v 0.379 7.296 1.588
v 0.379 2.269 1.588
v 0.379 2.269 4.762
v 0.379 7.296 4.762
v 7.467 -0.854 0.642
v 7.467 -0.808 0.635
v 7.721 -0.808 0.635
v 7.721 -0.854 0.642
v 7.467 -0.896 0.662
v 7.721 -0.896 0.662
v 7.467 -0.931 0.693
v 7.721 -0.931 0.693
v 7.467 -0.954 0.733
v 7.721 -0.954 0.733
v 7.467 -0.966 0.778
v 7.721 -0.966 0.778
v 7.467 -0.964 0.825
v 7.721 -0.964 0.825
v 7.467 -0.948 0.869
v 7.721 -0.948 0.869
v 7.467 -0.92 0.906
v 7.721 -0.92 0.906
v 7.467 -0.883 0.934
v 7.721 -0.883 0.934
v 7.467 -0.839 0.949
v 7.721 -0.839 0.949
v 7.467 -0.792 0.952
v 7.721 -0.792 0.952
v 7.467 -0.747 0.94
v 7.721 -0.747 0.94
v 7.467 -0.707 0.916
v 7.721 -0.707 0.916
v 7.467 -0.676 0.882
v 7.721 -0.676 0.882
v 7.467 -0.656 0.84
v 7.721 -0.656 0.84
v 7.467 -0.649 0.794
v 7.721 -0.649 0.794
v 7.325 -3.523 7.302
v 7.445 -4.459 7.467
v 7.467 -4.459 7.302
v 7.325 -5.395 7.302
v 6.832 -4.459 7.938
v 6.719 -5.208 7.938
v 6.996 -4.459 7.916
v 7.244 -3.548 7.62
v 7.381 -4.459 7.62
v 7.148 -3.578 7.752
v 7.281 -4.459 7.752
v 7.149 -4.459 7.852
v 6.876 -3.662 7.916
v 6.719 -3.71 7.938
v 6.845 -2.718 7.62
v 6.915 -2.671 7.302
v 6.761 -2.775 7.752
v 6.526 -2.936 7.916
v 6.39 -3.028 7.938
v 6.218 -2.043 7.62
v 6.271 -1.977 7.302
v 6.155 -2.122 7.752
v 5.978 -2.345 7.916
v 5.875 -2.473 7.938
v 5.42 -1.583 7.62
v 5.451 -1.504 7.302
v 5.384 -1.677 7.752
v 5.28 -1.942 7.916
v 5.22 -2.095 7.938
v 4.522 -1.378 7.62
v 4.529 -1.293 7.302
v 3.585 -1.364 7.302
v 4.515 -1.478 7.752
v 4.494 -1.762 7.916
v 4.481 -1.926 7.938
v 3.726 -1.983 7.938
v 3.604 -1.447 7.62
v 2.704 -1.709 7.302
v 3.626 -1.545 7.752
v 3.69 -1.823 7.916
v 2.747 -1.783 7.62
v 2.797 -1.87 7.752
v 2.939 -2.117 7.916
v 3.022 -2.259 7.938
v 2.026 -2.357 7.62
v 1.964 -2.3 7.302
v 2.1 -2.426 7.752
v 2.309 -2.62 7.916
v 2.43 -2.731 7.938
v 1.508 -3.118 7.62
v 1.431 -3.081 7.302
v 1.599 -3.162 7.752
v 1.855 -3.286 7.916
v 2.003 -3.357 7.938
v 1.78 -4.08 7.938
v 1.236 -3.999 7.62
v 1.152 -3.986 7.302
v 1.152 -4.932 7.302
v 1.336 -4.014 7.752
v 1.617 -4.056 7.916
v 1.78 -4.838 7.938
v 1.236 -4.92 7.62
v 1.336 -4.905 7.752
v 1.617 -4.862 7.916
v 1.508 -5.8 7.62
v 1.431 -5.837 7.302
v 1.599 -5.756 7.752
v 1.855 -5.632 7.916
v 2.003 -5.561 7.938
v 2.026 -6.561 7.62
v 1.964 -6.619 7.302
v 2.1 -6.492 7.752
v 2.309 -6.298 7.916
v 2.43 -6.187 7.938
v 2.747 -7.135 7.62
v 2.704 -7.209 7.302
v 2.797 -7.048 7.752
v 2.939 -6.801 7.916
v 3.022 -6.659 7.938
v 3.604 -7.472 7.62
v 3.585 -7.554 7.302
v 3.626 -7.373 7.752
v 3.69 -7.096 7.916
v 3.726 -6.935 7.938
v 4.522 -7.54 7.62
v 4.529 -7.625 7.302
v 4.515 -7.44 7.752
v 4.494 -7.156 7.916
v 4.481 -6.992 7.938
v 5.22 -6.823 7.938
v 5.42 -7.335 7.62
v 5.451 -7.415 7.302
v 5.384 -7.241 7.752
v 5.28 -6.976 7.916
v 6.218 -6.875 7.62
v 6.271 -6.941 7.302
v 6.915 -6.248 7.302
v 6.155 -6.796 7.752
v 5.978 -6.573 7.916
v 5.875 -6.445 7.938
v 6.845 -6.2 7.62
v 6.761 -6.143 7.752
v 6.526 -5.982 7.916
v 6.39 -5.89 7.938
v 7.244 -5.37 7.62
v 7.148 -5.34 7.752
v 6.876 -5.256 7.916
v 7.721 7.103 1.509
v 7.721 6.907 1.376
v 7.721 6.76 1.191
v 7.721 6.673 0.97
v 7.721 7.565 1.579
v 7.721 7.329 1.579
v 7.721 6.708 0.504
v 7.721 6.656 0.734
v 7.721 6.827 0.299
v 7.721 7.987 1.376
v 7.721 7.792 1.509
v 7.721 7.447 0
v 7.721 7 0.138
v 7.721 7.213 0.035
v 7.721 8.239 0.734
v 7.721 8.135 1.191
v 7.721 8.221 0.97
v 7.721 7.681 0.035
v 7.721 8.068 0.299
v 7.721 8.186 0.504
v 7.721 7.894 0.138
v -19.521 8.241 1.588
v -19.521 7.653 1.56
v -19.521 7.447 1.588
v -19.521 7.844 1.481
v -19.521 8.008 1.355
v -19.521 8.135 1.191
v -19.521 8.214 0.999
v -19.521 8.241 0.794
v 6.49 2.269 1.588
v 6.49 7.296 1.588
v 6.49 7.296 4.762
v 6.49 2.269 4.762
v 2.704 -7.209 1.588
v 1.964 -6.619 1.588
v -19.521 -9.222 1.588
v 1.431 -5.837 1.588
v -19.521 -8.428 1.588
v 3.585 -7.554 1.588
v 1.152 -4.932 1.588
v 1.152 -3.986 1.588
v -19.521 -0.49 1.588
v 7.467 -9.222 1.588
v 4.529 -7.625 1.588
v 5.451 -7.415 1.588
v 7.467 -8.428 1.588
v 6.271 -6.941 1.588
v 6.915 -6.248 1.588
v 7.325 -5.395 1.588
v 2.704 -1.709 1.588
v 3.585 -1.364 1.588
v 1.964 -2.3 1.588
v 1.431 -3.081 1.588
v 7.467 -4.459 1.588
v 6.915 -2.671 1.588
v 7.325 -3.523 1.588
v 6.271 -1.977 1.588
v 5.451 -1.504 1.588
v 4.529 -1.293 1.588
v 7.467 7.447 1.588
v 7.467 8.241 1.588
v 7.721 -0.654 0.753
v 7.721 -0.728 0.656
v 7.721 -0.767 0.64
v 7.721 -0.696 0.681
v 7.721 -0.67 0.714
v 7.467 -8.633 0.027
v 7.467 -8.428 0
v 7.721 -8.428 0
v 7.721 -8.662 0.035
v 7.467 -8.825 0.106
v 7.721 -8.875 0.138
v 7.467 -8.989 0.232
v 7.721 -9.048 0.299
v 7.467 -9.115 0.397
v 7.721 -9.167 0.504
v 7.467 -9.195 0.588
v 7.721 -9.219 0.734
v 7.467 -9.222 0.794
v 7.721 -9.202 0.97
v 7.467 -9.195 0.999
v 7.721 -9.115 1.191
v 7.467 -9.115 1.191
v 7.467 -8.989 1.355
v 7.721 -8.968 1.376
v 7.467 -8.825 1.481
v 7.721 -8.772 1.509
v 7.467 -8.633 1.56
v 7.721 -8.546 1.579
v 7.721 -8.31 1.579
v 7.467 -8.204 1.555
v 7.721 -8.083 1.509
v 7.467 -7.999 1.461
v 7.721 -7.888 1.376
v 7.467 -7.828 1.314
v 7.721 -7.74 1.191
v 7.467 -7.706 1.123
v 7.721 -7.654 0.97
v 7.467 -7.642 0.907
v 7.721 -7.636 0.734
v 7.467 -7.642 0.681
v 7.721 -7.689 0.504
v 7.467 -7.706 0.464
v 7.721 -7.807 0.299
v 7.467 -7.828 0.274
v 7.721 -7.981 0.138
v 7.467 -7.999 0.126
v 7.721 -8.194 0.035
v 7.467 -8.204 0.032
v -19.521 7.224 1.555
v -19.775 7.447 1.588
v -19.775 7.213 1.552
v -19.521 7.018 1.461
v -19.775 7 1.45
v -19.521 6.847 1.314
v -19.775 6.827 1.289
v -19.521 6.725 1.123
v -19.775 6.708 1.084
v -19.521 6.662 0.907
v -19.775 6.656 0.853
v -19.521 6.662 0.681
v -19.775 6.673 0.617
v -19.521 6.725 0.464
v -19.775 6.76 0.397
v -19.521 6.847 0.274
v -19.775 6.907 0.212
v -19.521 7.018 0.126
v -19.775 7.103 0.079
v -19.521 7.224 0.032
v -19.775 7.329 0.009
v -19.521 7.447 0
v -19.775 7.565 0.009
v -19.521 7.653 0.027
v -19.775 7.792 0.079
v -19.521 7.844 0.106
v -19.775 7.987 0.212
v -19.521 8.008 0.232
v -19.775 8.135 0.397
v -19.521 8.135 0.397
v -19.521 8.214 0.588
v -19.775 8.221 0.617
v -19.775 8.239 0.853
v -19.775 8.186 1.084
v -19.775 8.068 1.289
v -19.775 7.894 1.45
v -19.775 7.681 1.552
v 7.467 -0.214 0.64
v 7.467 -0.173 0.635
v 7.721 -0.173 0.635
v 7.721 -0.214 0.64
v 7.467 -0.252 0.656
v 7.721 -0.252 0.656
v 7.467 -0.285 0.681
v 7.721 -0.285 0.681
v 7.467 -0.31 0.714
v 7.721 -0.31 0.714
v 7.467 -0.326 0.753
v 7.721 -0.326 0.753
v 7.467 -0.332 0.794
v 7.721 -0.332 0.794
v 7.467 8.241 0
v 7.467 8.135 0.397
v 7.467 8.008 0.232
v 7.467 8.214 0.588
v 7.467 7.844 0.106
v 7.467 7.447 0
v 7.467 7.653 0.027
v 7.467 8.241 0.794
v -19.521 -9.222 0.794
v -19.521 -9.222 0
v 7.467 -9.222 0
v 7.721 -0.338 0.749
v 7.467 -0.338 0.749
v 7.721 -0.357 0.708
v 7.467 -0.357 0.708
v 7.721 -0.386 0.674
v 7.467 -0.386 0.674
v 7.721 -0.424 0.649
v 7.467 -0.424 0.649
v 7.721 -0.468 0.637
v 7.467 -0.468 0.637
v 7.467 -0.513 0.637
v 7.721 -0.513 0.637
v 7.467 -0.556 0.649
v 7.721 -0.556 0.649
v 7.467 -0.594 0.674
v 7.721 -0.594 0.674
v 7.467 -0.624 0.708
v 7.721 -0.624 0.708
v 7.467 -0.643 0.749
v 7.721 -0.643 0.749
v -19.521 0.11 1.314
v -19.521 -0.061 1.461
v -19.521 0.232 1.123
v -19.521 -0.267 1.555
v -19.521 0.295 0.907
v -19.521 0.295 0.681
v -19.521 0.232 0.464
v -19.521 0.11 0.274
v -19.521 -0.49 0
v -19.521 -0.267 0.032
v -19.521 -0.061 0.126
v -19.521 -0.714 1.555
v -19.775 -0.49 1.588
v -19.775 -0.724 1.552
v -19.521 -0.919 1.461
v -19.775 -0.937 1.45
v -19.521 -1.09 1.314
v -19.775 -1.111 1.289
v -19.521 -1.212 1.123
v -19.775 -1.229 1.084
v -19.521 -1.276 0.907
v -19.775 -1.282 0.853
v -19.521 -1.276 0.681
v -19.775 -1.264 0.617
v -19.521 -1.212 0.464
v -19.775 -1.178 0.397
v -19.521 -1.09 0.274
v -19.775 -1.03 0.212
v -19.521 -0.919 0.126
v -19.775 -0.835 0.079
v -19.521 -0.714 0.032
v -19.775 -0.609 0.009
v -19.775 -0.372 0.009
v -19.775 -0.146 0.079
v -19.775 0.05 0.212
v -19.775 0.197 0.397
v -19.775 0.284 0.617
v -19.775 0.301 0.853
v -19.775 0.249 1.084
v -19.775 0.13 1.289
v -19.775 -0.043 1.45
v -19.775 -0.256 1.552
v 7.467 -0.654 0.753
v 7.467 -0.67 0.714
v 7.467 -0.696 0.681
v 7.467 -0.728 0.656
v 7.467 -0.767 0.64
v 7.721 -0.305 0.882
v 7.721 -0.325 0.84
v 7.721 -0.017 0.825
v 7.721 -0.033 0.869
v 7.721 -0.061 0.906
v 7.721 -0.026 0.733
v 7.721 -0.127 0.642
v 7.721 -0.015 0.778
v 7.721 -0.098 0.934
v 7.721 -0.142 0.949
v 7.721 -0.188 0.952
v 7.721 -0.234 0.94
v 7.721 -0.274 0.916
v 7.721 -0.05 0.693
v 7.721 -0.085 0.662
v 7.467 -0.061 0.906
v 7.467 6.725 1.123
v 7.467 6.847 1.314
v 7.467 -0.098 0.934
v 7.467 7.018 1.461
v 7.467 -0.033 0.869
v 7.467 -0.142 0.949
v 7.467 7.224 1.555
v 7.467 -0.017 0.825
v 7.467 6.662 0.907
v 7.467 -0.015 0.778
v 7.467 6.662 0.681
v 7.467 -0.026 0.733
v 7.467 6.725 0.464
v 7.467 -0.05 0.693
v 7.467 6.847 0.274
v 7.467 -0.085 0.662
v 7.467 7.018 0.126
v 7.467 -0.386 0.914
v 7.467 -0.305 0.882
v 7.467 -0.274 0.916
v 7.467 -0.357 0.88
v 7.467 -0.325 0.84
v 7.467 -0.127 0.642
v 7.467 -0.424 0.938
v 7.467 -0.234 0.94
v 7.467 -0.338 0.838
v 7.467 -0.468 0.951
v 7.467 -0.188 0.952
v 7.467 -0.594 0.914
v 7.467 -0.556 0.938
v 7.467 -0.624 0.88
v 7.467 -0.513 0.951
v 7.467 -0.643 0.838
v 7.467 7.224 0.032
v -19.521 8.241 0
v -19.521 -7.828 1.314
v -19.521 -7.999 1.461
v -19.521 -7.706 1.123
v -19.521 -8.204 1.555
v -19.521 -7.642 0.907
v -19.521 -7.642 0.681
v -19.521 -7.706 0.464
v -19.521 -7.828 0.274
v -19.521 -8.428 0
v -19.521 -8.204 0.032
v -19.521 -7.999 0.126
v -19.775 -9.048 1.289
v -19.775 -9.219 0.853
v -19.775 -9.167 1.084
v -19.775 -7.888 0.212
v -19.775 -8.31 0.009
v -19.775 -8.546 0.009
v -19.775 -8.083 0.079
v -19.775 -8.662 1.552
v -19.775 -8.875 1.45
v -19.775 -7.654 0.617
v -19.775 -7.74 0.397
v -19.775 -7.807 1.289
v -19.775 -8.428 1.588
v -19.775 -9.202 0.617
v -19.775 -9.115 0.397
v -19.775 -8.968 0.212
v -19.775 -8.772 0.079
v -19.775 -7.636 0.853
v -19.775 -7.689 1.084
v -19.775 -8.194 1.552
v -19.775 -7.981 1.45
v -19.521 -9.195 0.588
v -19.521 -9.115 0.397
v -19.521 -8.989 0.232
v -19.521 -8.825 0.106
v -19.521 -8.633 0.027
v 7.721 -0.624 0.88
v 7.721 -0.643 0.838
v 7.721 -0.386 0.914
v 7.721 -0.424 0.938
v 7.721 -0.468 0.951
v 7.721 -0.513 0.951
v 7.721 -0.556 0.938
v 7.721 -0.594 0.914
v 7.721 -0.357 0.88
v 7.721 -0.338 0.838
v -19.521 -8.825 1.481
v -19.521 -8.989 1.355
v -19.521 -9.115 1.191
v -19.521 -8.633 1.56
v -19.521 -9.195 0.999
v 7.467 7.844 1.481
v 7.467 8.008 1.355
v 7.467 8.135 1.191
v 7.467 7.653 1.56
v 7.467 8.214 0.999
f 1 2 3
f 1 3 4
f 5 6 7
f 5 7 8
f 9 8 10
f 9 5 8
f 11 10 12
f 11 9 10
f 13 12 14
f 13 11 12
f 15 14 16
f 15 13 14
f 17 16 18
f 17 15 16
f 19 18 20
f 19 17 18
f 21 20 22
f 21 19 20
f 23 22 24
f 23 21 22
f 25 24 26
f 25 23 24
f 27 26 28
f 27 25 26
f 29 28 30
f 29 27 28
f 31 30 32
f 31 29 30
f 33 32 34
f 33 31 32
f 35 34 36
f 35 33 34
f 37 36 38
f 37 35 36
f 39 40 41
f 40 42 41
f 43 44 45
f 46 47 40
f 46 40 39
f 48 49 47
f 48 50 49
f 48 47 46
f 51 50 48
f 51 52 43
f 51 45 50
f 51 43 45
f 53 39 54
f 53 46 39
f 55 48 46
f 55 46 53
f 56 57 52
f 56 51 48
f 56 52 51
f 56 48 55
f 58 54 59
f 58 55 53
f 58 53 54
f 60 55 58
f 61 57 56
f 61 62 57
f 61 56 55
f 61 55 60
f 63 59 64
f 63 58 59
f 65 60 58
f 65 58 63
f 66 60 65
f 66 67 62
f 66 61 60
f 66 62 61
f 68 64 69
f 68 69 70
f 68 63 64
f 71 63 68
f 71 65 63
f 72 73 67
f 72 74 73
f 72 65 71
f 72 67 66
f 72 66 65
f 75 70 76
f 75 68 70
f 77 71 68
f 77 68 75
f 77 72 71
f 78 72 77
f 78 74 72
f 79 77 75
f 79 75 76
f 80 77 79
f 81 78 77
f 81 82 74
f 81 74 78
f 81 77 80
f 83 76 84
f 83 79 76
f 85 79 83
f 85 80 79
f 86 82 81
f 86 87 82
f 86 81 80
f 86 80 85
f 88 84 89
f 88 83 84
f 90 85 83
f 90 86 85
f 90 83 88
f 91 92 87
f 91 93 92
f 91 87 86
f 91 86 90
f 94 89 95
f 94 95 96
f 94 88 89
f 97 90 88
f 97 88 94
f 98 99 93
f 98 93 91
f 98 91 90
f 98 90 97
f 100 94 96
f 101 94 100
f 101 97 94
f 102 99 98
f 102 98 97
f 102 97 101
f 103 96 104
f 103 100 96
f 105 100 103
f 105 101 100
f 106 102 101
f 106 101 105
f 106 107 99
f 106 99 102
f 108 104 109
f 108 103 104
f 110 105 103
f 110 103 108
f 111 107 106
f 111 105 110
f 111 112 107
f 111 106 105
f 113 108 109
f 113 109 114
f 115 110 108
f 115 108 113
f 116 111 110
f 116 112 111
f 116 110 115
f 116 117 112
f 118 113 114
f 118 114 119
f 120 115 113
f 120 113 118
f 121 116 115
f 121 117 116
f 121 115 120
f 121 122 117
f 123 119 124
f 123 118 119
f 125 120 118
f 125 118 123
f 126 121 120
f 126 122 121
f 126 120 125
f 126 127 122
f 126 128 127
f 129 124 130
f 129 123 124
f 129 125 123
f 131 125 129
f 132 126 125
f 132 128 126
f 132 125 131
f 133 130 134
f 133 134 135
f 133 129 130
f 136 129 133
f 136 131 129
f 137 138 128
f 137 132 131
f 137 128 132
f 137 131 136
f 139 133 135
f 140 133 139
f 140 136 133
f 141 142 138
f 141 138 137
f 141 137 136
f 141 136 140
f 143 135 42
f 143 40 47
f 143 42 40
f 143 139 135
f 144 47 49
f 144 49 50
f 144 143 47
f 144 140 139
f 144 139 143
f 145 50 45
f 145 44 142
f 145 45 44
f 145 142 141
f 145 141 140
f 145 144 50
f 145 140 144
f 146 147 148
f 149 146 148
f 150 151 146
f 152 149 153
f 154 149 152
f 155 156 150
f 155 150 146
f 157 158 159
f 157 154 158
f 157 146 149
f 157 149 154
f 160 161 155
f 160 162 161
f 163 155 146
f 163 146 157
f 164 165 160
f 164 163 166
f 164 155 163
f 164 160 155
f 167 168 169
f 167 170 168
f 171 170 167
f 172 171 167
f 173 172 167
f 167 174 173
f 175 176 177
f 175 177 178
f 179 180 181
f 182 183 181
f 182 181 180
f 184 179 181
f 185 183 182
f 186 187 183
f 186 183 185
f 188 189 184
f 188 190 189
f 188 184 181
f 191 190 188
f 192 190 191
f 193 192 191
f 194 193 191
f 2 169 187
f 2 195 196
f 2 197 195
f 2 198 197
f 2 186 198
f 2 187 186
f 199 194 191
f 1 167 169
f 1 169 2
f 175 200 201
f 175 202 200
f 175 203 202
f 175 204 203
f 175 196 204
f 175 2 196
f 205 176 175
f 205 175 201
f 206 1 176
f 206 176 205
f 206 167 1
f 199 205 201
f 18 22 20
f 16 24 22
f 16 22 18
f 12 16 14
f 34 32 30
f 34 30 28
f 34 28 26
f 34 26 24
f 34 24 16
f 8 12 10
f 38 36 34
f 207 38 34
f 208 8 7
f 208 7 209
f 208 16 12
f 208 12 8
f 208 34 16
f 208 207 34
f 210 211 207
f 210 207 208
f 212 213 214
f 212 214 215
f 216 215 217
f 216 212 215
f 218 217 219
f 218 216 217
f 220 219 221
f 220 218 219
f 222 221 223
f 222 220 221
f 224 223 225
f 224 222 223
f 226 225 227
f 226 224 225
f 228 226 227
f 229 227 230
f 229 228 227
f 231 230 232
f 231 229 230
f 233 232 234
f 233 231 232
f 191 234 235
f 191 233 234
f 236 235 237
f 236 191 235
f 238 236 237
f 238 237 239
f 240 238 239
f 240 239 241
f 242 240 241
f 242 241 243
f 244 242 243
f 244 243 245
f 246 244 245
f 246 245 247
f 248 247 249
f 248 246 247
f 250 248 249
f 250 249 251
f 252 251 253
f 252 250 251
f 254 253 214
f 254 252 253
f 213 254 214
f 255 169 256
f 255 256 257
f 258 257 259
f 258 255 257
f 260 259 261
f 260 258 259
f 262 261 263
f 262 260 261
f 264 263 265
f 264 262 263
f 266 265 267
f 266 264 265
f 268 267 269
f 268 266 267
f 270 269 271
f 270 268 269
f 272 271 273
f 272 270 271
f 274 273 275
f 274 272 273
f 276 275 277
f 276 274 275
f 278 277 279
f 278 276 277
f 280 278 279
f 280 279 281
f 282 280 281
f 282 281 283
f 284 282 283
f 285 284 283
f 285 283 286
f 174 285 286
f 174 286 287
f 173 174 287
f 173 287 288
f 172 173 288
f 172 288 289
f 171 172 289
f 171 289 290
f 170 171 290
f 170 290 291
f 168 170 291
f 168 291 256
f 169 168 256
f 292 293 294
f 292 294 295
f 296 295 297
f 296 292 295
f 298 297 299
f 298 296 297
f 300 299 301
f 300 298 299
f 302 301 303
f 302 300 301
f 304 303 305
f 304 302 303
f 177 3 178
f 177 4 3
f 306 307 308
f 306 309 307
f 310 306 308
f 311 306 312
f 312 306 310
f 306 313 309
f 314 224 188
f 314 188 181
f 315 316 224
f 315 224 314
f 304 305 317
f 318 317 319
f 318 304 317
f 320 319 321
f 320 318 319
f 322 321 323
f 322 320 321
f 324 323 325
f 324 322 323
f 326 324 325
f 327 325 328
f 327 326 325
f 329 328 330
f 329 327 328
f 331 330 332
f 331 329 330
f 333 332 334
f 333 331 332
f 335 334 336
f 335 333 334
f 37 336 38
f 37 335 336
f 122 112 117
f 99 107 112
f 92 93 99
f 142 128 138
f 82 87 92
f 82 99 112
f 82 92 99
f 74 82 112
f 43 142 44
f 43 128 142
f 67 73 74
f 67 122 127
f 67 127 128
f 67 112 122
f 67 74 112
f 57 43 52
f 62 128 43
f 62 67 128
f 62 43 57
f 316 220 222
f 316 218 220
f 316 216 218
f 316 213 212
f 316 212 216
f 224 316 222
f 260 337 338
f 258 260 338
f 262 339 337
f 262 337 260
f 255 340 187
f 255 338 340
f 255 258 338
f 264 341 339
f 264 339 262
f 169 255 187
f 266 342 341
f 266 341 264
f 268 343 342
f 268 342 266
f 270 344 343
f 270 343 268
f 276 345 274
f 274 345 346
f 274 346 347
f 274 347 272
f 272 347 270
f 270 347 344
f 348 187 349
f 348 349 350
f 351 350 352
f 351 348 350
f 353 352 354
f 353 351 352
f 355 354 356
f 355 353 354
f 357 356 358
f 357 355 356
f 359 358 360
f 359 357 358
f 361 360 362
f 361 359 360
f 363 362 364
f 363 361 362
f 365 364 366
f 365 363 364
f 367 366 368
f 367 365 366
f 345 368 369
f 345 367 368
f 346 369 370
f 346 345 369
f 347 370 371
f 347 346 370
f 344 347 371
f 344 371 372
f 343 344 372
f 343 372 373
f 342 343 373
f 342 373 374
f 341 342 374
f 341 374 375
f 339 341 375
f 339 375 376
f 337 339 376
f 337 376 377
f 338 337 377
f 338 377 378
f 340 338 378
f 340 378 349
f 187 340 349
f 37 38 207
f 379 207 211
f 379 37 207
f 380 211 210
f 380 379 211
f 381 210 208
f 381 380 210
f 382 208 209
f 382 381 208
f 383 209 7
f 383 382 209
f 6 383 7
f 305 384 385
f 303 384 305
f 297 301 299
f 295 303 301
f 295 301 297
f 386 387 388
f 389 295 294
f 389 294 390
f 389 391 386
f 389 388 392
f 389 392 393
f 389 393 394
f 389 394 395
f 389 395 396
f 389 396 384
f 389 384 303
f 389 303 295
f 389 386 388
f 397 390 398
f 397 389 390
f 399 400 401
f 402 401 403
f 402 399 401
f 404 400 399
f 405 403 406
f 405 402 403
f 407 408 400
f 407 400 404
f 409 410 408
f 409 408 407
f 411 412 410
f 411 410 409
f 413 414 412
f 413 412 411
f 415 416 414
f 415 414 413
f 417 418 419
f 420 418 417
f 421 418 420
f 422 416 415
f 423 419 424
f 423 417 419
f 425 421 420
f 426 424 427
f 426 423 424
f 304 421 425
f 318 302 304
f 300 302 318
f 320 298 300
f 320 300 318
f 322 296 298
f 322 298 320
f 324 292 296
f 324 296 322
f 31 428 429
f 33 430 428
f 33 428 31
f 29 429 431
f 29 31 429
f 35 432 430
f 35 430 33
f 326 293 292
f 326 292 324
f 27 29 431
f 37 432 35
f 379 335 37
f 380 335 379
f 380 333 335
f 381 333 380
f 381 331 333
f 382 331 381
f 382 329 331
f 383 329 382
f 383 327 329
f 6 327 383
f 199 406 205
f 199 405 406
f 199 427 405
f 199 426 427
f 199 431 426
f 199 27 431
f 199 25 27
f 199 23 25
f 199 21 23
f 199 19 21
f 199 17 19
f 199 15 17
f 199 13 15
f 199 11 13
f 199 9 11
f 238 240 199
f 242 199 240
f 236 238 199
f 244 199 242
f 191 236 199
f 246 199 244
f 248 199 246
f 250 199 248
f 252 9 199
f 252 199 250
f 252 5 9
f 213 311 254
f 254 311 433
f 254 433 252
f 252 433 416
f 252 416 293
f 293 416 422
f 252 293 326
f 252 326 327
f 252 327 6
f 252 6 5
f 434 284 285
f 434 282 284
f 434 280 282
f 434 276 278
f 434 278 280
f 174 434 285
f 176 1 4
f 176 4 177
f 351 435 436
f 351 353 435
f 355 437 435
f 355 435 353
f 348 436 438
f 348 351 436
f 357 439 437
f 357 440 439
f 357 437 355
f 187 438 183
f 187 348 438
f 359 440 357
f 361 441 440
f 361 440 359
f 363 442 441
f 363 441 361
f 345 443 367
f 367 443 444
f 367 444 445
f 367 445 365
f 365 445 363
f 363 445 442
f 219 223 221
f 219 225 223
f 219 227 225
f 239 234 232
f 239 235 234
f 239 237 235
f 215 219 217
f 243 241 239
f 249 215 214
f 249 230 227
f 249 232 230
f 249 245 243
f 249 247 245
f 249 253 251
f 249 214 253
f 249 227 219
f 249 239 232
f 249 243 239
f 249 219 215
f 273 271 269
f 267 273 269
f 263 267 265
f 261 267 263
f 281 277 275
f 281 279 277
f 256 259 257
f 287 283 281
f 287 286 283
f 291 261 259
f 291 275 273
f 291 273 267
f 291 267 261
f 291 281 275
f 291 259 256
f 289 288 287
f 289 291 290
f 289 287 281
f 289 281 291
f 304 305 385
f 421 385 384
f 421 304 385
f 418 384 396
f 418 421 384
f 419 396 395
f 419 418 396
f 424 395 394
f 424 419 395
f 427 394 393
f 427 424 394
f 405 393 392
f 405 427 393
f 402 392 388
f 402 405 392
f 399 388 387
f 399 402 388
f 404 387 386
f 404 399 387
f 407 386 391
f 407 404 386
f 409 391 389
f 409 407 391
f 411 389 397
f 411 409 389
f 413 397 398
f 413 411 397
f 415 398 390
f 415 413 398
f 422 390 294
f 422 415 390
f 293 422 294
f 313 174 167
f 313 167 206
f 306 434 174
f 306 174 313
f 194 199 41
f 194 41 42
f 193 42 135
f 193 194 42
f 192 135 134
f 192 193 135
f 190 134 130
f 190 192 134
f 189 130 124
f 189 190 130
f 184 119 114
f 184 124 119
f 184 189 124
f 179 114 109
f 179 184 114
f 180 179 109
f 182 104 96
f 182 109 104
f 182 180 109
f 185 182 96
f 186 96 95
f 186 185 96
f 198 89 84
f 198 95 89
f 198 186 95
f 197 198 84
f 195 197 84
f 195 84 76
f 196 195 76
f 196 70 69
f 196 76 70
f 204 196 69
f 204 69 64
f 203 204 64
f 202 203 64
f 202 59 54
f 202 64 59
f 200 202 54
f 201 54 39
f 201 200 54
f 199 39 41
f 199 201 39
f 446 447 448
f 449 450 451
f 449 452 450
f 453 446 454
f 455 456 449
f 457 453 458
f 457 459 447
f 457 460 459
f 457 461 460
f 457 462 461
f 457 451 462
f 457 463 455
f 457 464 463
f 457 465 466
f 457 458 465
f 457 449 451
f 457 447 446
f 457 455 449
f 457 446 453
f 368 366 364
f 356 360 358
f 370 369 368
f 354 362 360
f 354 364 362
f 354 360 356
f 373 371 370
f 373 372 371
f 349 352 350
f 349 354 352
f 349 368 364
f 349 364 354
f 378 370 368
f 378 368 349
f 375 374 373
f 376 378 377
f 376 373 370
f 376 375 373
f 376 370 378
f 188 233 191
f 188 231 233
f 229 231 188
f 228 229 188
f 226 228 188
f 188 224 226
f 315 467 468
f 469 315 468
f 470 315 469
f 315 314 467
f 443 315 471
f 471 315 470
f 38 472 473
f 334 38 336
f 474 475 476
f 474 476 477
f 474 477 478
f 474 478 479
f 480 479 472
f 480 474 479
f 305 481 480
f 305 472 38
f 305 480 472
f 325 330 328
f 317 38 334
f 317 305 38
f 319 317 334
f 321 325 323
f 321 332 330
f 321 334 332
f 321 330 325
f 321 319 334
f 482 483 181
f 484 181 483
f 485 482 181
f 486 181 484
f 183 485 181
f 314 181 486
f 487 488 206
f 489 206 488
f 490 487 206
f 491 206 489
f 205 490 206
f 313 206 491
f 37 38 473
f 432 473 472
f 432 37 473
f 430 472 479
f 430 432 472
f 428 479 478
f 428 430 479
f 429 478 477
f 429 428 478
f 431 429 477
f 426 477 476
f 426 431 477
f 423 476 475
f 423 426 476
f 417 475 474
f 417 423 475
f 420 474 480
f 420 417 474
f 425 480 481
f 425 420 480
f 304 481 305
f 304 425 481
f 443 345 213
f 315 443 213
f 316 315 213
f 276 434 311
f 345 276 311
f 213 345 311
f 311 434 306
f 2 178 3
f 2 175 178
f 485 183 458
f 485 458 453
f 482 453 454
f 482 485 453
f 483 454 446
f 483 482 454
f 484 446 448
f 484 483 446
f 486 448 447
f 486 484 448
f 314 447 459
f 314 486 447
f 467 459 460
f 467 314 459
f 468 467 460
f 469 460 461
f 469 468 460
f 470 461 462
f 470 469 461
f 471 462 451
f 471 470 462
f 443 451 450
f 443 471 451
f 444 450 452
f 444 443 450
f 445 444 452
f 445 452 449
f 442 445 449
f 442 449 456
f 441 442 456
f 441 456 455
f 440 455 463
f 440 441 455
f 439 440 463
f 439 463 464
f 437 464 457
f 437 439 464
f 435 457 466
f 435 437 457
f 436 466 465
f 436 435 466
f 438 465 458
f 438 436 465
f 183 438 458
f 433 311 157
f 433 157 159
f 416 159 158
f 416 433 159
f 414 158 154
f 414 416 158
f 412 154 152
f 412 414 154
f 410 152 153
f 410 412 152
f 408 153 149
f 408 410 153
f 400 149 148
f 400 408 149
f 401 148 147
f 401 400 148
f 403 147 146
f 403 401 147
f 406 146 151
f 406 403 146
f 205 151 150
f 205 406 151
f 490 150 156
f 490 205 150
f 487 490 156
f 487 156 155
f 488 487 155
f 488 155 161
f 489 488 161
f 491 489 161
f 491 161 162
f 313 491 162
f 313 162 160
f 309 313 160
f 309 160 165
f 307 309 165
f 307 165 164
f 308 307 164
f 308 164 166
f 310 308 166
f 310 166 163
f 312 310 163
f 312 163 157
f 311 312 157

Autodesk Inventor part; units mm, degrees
ref_plane "YZ Plane" through (0, 0, 0) normal (1, 0, 0) x (0, 1, 0)
ref_plane "XZ Plane" through (0, 0, 0) normal (0, 1, 0) x (-1, 0, 0)
ref_plane "XY Plane" through (0, 0, 0) normal (0, 0, 1) x (1, 0, 0)
sketch "Sketch1" plane through (0, 0, 0) normal (0, 0, 1) x (1, 0, 0)
  line L0 (-19.520958, 8.240943) -> (7.466542, 8.240943)
  line L1 (7.466542, 8.240943) -> (7.466542, -9.221557)
  line L2 (7.466542, -9.221557) -> (-19.520958, -9.221557)
  line L3 (-19.520958, -9.221557) -> (-19.520958, 8.240943)
  point P0 (0, 0)
  dimension "d0" = 17.4625
  dimension "d1" = 26.9875
extrude "Extrusion1" add sketch "Sketch1" along normal blind 1.5875
sketch "Sketch2" plane through (0, 0, 1.5875) normal (0, 0, 1) x (1, 0, 0)
  line L0 (7.466542, 8.240943) -> (7.466542, -9.221557)
  line L1 (7.466542, -9.221557) -> (-19.520958, -9.221557)
  circle A0 centre (4.291542, -4.459057) radius 3.175
  point P0 (0, 0)
  dimension "d4" = 4.7625
  dimension "d5" = 6.35
extrude "Extrusion2" add sketch "Sketch2" along normal blind 6.35
fillet "Fillet1" radius 0.635 1 edges at (1.1165, -4.4591, 7.9375)
sketch "Sketch3" plane through (0, 0, 1.5875) normal (0, 0, 1) x (1, 0, 0)
  line L0 (0.379367, 7.296145) -> (6.490253, 7.296145)
  line L1 (6.490253, 7.296145) -> (6.490253, 2.269448)
  line L2 (6.490253, 2.269448) -> (0.379367, 2.269448)
  line L3 (0.379367, 2.269448) -> (0.379367, 7.296145)
  point P0 (0, 0)
extrude "Extrusion3" add sketch "Sketch3" along normal blind 3.175
sketch "Sketch4" plane through (7.466542, -9.221557, 0) normal (1, 0, 0) x (0, 0, -1)
  line L0 (-1.5875, 17.4625) -> (-1.5875, 4.7625)
  line L1 (-1.5875, 4.7625) -> (-1.5875, 0)
  line L2 (0, 0) -> (-1.5875, 0)
  line L3 (0, 17.4625) -> (0, 0)
  line L4 (0, 17.4625) -> (-1.5875, 17.4625)
  circle A0 centre (-0.79375, 16.66875) radius 0.79375
  circle A1 centre (-0.79375, 0.79375) radius 0.79375
  circle A2 centre (-0.79375, 8.73125) radius 0.15875
  circle A3 centre (-0.79375, 9.04875) radius 0.15875
  circle A4 centre (-0.79375, 8.41375) radius 0.15875
  line L5 (-0.79375, 0.79375) -> (-0.79375, 16.66875) construction
  line L6 (-0.79375, 0.79375) -> (-0.79375, 8.73125) construction
  line L7 (-0.79375, 8.73125) -> (-0.79375, 16.66875) construction
  point P0 (0, 9.221557)
  dimension "d11" = 0.3175
extrude "Extrusion4" add sketch "Sketch4" along normal blind 0.254 contours A0 | A1 | A2 | A4 | A3
sketch "Sketch5" plane through (-19.520958, -9.221557, 0) normal (-1, 0, 0) x (0, 0, 1)
  line L0 (1.5875, 0) -> (1.5875, 17.4625)
  line L1 (0, 17.4625) -> (1.5875, 17.4625)
  line L2 (0, 0) -> (0, 17.4625)
  line L3 (0, 0) -> (1.5875, 0)
  circle A0 centre (0.79375, 16.66875) radius 0.79375
  circle A1 centre (0.79375, 8.73125) radius 0.79375
  circle A2 centre (0.79375, 0.79375) radius 0.79375
  line L4 (0.79375, 16.66875) -> (0.79375, 8.73125) construction
  line L5 (0.79375, 0.79375) -> (0.79375, 8.73125) construction
  point P0 (0, 9.221557)
extrude "Extrusion5" add sketch "Sketch5" along normal blind 0.254 contours A2 | A1 | A0
sketch "Sketch6" plane through (7.720542, -8.427807, 0.79375) normal (1, 0, 0) x (0, 0, -1)
  circle A0 centre (0, 0) radius 0.79375 construction
sketch "Sketch7" plane through (7.720542, -0.172807, 0.79375) normal (1, 0, 0) x (0, 0, -1)
  circle A0 centre (0, 0) radius 0.15875 construction
  point P0 (0, -0.15875)
sketch "Sketch8" plane through (7.720542, -9.221557, 0) normal (1, 0, 0) x (0, 0, -1)
  arc A0 (-0.79375, 8.5725) -> (-0.79375, 8.89) centre (-0.79375, 8.73125) ccw construction
sketch "Sketch9" plane through (7.720542, -0.807807, 0.79375) normal (1, 0, 0) x (0, 0, -1)
  circle A0 centre (0, 0) radius 0.15875 construction
  point P0 (0, 0.15875)
sketch "Sketch10" plane through (-19.774958, 7.447193, 0.79375) normal (-1, 0, 0) x (0, 0, 1)
  circle A0 centre (0, 0) radius 0.79375 construction
sketch "Sketch11" plane through (-19.774958, -0.490307, 0.79375) normal (-1, 0, 0) x (0, 0, 1)
  circle A0 centre (0, 0) radius 0.79375 construction
sketch "Sketch12" plane through (-19.774958, -8.427807, 0.79375) normal (-1, 0, 0) x (0, 0, 1)
  circle A0 centre (0, 0) radius 0.79375 construction
properties part number "ESC"
